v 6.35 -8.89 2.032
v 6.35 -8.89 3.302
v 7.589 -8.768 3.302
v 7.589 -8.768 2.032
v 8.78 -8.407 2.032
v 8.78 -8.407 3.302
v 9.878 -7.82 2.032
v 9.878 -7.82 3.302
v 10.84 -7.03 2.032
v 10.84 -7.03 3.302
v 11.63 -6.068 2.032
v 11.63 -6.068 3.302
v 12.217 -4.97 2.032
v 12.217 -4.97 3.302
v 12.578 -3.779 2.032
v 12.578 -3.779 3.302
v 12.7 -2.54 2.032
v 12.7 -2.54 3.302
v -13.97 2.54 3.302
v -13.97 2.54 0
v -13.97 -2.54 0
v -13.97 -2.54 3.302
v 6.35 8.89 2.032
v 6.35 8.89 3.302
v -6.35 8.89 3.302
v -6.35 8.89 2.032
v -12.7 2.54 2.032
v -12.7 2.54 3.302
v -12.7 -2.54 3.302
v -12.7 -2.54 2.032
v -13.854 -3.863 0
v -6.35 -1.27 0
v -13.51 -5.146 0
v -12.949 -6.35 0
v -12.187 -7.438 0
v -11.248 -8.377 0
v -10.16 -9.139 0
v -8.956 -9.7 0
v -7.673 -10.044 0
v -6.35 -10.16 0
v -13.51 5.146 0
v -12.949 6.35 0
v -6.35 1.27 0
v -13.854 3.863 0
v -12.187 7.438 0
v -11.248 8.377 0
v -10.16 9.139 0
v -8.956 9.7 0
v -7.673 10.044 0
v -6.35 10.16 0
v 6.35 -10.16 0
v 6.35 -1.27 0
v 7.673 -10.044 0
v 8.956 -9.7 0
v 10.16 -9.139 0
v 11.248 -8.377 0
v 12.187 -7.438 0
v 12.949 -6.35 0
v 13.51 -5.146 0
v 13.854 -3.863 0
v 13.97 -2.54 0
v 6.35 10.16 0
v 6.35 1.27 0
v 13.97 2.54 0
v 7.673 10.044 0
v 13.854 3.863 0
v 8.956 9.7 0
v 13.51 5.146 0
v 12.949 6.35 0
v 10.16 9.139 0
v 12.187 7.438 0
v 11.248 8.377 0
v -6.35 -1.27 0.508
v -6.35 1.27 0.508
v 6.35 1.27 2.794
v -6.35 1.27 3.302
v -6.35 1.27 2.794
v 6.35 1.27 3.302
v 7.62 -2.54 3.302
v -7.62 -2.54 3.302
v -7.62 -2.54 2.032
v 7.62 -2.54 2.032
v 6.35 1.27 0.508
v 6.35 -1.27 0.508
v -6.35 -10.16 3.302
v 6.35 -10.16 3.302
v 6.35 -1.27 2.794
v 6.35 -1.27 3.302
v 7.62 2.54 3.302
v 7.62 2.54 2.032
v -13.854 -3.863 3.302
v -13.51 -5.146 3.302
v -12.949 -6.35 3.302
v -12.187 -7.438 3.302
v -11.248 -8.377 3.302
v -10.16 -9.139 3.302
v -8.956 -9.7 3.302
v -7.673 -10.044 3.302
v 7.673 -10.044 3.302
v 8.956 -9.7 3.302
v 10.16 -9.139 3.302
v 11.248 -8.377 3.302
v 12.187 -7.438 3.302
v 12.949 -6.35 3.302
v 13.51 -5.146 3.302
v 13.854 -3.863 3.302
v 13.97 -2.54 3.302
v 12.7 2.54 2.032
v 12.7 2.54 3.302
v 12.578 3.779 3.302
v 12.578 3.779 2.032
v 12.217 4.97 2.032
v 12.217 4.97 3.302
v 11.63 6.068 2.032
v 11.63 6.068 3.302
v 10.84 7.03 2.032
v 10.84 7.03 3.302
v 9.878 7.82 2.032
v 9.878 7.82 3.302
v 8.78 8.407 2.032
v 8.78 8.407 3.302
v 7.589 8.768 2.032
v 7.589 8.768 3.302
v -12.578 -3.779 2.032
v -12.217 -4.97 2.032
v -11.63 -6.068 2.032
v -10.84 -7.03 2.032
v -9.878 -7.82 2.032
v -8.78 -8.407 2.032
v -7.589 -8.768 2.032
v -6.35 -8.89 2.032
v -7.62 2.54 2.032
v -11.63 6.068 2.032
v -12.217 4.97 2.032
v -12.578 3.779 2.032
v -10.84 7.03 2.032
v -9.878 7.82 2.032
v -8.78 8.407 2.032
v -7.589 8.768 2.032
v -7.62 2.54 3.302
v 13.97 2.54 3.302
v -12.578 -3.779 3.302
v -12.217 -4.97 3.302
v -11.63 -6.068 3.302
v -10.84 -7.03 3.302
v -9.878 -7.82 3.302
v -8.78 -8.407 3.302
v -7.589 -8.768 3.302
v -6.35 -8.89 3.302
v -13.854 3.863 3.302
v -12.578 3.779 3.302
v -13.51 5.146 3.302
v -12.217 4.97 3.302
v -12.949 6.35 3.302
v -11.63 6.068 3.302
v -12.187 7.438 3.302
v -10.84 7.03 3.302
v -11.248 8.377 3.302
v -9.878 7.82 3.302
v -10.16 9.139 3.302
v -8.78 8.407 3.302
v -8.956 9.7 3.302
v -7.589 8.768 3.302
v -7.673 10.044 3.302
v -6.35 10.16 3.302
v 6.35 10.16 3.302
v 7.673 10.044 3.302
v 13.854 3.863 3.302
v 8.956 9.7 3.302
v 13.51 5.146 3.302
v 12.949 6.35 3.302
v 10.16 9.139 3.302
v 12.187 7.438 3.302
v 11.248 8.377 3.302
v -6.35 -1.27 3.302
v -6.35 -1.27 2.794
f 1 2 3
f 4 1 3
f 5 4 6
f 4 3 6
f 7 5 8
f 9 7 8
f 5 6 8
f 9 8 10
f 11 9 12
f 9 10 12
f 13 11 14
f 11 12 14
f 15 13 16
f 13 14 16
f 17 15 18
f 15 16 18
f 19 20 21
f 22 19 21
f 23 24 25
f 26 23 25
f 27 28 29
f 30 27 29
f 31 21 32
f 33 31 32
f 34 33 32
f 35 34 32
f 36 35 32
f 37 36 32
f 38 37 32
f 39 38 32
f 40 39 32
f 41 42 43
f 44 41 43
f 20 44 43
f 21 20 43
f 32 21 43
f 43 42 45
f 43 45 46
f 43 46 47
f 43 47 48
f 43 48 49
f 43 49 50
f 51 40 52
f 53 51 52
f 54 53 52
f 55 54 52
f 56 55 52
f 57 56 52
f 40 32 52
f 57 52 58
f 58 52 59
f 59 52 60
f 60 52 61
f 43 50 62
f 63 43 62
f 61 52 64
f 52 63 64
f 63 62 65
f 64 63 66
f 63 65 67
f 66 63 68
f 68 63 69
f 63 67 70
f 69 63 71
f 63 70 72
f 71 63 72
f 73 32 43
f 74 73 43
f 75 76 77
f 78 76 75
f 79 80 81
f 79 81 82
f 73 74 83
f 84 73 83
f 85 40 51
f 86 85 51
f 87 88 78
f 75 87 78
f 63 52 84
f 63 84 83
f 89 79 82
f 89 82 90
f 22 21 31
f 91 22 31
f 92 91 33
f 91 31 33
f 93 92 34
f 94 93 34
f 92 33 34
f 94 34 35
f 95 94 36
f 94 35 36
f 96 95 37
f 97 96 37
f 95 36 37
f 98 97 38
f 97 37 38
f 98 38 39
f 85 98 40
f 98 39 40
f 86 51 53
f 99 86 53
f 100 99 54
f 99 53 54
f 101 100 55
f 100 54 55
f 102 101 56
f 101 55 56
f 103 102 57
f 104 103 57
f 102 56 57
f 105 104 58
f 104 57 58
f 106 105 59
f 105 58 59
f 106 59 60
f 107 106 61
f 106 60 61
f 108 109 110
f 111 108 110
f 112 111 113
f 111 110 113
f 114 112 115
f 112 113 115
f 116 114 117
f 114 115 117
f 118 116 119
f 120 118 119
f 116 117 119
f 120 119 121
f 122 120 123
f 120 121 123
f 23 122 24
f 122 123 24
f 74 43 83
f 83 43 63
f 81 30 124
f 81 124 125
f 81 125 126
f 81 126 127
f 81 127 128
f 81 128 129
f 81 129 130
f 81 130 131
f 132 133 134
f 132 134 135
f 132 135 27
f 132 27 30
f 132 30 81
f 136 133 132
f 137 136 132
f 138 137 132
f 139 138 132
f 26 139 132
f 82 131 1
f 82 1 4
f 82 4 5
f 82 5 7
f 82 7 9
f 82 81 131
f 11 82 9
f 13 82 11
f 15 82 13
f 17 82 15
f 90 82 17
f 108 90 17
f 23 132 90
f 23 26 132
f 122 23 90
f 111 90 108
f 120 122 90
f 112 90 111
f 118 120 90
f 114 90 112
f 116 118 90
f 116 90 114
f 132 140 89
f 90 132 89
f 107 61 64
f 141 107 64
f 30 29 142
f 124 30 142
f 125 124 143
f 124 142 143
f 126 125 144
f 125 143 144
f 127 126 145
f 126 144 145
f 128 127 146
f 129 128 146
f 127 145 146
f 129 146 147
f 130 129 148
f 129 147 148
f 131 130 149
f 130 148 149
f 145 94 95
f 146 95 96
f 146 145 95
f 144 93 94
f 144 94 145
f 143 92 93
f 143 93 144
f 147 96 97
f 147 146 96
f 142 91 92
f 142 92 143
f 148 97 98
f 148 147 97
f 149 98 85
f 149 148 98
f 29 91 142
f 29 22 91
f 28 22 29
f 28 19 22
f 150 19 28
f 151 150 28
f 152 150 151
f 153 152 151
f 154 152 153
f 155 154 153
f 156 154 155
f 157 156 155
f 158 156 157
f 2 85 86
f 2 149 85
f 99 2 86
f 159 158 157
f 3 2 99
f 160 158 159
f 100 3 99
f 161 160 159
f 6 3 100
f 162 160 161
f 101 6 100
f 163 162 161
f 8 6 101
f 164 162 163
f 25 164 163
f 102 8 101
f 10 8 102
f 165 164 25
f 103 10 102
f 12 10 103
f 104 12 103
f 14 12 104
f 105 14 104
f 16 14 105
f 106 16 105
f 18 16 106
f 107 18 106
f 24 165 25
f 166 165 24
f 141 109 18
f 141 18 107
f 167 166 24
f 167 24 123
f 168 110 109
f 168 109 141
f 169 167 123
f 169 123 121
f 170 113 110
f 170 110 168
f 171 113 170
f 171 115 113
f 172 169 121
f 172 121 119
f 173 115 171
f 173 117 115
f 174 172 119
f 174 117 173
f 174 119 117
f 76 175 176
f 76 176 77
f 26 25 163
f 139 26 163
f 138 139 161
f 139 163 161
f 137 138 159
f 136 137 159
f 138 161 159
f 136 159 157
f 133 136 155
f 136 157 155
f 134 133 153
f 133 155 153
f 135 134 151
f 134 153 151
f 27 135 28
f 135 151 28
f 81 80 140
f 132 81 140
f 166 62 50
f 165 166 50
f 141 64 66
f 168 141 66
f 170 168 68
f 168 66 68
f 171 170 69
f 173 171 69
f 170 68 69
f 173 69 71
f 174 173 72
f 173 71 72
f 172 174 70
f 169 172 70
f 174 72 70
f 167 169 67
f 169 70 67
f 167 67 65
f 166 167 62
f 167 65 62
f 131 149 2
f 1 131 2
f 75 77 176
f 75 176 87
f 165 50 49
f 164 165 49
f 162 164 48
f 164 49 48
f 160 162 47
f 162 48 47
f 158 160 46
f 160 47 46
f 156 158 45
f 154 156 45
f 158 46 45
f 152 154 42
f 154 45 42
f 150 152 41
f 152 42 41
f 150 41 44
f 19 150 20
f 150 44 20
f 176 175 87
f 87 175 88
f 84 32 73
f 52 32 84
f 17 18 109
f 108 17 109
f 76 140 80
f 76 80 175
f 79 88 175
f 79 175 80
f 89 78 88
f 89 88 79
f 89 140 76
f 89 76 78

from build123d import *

# Parameters (mm, degrees)
F0_W     = 12.7
F0_H     = 2.54
F1_DEPTH = 3.302
F2_W     = 15.24
F2_H     = 5.08
F3_DEPTH = 1.27
F2_W_2   = 12.7
F2_H_2   = 2.54
F4_DEPTH = 0.508
F5_DEPTH = 0.508


with BuildPart() as f1:
    # F0 (on Top) → F1 (new body)
    with BuildSketch(Plane.XY):
        with BuildLine():
            Line((-6.35, -10.16), (6.35, -10.16))
            ThreePointArc((6.35, -10.16), (11.738154, -7.928154), (13.97, -2.54))
            Line((13.97, -2.54), (13.97, 2.54))
            ThreePointArc((13.97, 2.54), (11.738154, 7.928154), (6.35, 10.16))
            Line((6.35, 10.16), (-6.35, 10.16))
            ThreePointArc((-6.35, 10.16), (-11.738154, 7.928154), (-13.97, 2.54))
            Line((-13.97, 2.54), (-13.97, -2.54))
            ThreePointArc((-13.97, -2.54), (-11.738154, -7.928154), (-6.35, -10.16))
        make_face()
        Rectangle(F0_W, F0_H, mode=Mode.SUBTRACT)
        Rectangle(F0_W, F0_H)
    extrude(amount=F1_DEPTH)

    # F2 (on face) → F3 (cut)
    with BuildSketch(Plane.XY.offset(3.302)):
        with BuildLine():
            Line((-6.35, -8.89), (6.35, -8.89))
            ThreePointArc((6.35, -8.89), (10.840128, -7.030128), (12.7, -2.54))
            Line((12.7, -2.54), (12.7, 2.54))
            ThreePointArc((12.7, 2.54), (10.840128, 7.030128), (6.35, 8.89))
            Line((6.35, 8.89), (-6.35, 8.89))
            ThreePointArc((-6.35, 8.89), (-10.840128, 7.030128), (-12.7, 2.54))
            Line((-12.7, 2.54), (-12.7, -2.54))
            ThreePointArc((-12.7, -2.54), (-10.840128, -7.030128), (-6.35, -8.89))
        make_face()
        Rectangle(F2_W, F2_H, mode=Mode.SUBTRACT)
    extrude(amount=-F3_DEPTH, mode=Mode.SUBTRACT)

    # F2 (on face) → F4 (cut)
    with BuildSketch(Plane.XY.offset(3.302)):
        Rectangle(F2_W_2, F2_H_2)
    extrude(amount=-F4_DEPTH, mode=Mode.SUBTRACT)

    # F0 (on Top) → F5 (cut)
    with BuildSketch(Plane.XY):
        Rectangle(F0_W, F0_H)
    extrude(amount=F5_DEPTH, mode=Mode.SUBTRACT)


solid = f1.part
